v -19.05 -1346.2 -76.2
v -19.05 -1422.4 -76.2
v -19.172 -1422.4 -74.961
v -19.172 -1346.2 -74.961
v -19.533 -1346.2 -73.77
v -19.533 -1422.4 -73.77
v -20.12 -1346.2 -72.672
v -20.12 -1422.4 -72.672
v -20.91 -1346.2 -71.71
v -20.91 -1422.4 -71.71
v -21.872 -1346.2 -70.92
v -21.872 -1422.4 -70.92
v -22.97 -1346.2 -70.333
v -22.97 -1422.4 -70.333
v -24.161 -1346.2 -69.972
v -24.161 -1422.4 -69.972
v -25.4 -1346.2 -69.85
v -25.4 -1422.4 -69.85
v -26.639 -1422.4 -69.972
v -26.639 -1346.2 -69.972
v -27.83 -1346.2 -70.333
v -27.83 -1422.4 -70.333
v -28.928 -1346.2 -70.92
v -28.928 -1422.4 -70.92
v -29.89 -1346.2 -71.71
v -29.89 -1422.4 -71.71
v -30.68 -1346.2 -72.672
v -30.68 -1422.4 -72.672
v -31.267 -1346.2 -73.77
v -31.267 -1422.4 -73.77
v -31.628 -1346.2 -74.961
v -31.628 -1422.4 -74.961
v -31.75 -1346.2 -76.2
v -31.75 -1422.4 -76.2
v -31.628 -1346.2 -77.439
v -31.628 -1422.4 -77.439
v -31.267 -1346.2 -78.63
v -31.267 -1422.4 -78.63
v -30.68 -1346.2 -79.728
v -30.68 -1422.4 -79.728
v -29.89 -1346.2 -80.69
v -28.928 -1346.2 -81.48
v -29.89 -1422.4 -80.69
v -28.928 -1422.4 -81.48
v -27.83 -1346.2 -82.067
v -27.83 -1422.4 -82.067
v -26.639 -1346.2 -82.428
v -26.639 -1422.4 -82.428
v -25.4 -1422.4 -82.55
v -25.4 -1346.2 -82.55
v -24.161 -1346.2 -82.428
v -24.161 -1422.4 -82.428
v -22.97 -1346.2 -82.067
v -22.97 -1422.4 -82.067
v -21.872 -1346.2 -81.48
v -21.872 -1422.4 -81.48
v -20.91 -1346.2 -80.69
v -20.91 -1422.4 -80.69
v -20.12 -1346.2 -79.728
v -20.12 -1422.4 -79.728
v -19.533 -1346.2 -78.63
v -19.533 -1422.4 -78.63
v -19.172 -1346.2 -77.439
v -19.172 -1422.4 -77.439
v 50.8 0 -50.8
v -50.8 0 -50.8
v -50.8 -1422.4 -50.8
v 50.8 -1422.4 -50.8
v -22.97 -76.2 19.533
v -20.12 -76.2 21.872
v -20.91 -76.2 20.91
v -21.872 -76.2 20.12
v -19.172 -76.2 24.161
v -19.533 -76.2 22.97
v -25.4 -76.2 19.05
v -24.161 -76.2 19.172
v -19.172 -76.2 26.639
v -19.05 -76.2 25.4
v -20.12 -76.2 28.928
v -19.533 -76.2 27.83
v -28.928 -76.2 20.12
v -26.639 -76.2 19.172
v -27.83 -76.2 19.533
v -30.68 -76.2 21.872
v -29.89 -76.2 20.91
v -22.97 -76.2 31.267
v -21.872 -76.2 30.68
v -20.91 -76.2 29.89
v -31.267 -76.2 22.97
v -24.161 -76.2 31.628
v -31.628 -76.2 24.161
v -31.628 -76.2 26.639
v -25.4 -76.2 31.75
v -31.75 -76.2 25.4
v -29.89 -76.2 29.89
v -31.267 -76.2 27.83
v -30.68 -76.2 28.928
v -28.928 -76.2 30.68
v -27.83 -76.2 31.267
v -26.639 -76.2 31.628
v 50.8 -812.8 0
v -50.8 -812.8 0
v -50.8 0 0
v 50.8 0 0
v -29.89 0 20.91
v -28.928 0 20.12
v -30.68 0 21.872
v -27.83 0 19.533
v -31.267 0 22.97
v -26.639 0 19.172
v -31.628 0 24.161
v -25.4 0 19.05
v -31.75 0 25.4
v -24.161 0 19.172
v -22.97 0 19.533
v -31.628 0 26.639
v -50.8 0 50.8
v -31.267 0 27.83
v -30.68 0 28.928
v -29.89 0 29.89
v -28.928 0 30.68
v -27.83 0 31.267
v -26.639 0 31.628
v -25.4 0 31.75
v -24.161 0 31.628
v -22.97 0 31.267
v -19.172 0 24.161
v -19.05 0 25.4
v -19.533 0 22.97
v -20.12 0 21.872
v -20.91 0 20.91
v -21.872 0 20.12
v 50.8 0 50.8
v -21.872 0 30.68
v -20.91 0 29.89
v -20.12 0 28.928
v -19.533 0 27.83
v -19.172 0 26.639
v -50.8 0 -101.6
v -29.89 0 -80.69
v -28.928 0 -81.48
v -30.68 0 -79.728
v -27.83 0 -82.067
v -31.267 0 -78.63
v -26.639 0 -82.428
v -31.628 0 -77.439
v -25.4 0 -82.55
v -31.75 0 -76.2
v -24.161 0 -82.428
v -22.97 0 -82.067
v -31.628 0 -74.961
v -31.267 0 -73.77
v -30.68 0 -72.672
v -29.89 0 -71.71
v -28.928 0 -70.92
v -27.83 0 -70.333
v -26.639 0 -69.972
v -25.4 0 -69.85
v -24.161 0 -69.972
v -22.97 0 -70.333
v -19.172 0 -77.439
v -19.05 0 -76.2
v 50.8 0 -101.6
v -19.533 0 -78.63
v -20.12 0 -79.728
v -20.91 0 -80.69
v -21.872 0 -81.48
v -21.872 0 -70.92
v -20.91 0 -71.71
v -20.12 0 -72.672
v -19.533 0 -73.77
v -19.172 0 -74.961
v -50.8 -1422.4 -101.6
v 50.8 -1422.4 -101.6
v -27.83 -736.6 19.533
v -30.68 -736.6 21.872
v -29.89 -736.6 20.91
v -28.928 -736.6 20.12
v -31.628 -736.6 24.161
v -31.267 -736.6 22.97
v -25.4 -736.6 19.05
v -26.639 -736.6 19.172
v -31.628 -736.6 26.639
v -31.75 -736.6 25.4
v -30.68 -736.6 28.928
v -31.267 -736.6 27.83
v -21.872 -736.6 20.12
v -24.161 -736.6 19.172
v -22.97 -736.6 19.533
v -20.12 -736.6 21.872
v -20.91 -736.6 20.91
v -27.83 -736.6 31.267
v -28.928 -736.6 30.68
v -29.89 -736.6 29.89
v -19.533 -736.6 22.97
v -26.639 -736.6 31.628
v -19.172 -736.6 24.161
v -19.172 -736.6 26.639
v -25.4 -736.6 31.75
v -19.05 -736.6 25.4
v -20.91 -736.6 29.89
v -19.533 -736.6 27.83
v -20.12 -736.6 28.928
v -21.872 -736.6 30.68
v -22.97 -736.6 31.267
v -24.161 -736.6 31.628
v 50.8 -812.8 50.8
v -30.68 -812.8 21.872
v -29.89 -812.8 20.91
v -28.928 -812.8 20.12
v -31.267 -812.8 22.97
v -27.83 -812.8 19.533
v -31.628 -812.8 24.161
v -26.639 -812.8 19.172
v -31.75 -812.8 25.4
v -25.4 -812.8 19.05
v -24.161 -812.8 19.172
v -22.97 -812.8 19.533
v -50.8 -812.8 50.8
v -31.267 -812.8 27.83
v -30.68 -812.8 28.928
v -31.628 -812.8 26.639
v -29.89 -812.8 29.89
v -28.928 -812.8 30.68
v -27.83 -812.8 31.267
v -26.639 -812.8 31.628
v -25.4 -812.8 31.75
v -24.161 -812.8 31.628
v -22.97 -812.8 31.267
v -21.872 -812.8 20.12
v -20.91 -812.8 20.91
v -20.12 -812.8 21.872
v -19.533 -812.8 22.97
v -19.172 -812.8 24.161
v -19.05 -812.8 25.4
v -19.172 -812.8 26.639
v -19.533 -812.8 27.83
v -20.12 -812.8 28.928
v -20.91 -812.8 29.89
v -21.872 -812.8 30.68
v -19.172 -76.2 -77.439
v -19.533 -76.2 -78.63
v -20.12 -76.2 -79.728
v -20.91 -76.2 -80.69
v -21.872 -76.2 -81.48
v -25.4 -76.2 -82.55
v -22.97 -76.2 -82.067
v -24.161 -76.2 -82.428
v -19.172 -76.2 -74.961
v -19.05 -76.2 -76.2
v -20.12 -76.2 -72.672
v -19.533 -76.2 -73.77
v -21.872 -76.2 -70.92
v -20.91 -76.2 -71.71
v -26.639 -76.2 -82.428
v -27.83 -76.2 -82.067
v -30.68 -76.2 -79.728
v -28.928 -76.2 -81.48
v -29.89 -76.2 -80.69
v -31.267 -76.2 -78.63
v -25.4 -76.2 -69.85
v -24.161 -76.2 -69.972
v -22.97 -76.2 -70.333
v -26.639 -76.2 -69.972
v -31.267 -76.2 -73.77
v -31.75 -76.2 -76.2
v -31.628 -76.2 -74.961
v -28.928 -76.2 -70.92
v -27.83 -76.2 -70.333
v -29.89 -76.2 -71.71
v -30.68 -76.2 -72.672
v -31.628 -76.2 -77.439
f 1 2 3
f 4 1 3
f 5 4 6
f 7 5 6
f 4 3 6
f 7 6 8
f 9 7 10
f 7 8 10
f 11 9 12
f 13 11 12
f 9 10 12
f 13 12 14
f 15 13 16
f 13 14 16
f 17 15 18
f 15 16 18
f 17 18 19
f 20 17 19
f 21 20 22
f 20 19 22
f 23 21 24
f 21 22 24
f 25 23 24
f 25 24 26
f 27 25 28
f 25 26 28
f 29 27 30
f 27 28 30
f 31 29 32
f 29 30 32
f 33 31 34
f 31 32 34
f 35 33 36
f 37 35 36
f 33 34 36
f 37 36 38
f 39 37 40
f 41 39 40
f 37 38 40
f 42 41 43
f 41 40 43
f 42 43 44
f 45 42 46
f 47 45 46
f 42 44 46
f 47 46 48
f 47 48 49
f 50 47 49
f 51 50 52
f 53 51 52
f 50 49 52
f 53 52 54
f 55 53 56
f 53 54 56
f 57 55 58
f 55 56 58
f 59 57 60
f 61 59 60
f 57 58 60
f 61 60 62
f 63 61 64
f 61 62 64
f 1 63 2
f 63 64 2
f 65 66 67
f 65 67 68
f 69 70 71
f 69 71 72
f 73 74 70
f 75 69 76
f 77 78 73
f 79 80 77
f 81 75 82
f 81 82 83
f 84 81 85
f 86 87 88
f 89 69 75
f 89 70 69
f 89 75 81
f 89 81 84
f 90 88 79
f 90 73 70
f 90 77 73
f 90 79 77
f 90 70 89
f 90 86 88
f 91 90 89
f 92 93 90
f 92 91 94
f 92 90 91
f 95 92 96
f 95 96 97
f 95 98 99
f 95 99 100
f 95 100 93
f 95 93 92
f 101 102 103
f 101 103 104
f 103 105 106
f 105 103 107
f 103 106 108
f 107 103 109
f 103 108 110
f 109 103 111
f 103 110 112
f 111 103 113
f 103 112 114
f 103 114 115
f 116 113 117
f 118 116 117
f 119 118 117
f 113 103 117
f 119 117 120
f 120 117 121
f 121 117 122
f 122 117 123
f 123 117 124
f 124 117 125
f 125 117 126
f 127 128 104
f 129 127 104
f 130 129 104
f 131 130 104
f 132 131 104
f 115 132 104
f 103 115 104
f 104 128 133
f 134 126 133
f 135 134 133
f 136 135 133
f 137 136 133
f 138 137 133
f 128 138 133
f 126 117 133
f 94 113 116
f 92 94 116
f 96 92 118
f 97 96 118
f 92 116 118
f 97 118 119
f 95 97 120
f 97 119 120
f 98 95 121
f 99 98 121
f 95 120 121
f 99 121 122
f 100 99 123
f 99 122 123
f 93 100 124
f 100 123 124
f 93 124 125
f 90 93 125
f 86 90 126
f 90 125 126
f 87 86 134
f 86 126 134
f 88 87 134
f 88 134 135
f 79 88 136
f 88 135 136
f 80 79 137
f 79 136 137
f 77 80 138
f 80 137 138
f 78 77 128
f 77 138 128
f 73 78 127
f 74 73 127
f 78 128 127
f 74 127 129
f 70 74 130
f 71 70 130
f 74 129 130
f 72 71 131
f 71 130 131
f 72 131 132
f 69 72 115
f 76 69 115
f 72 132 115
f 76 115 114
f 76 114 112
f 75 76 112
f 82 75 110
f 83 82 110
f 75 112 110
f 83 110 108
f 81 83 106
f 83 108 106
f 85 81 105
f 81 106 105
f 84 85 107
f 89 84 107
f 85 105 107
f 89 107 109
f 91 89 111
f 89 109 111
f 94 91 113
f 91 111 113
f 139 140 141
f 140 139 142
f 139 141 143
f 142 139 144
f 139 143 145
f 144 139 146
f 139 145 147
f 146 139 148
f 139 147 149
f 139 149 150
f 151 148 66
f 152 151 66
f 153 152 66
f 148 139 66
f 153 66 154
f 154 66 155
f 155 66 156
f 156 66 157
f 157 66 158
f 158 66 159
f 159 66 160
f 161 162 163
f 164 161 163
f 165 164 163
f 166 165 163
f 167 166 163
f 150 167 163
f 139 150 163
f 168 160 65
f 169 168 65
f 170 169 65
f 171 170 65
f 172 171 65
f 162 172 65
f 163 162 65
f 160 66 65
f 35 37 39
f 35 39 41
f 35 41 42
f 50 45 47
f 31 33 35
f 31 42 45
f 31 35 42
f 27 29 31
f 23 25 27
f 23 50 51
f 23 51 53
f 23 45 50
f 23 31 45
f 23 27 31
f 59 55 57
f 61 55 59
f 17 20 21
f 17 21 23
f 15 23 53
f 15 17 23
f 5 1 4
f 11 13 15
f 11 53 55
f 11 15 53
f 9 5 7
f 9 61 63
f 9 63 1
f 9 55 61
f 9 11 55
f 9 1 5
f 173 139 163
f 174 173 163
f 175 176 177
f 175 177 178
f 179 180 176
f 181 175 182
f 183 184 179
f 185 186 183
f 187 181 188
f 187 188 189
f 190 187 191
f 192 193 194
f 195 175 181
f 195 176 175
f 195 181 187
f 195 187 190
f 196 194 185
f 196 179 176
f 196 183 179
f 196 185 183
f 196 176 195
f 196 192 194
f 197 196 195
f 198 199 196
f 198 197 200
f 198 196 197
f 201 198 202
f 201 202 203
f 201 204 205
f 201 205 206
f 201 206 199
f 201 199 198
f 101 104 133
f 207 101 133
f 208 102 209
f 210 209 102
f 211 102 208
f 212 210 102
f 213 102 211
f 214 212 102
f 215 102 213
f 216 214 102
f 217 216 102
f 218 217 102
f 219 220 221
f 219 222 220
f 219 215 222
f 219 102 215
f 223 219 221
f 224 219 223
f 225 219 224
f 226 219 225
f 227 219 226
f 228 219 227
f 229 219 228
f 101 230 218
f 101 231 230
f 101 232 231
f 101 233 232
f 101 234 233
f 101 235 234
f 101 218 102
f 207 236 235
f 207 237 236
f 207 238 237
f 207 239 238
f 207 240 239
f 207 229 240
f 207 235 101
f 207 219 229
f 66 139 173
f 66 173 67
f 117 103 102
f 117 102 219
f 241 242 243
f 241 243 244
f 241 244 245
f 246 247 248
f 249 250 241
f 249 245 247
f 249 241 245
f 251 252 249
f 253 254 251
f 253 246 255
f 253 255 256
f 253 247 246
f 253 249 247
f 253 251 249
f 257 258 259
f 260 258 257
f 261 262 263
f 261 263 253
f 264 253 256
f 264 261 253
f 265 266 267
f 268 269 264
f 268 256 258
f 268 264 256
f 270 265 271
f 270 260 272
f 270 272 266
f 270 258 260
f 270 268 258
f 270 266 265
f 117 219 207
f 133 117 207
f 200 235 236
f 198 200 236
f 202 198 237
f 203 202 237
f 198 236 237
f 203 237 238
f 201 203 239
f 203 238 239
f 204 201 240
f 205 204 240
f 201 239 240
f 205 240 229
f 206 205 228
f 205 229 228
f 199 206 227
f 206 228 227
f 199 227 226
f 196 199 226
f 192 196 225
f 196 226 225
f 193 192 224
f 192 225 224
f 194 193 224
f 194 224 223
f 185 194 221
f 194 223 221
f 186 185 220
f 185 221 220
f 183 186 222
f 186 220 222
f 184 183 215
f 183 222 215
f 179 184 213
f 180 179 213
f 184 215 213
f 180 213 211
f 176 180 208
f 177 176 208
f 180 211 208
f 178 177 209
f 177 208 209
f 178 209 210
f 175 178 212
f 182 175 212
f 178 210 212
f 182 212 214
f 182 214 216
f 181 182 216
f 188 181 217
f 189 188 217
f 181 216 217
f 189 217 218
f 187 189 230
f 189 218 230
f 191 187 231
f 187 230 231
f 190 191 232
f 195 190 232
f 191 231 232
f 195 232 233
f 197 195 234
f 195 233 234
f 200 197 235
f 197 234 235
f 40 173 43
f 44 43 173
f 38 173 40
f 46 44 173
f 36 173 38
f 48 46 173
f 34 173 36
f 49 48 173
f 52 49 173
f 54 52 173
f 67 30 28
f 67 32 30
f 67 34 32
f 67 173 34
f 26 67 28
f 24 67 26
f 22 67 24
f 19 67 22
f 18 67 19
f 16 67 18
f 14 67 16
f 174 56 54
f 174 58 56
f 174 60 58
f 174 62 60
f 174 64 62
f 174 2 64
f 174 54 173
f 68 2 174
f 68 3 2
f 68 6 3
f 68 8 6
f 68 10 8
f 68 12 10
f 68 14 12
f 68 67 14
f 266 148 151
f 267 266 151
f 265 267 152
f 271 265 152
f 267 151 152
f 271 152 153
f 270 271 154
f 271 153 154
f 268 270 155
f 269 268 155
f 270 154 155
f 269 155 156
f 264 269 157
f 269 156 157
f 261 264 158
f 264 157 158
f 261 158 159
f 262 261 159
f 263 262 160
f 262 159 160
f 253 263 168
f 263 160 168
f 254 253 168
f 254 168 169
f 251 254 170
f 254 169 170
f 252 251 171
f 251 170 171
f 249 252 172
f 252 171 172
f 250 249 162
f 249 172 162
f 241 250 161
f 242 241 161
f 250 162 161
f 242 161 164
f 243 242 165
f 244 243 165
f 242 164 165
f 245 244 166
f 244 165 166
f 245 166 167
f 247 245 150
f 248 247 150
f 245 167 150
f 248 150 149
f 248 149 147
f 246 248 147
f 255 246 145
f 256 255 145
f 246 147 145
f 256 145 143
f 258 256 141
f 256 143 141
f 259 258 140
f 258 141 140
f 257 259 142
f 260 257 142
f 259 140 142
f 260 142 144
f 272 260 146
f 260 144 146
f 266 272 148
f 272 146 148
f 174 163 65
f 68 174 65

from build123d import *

# Parameters (mm, degrees)
F0_W      = 101.6
F0_H      = 50.8
F1_DEPTH  = 812.8
F2_W      = 101.6
F2_H      = 50.8
F3_DEPTH  = 1422.4
F4_R      = 6.35
F5_DEPTH  = 76.2
F6_R      = 6.35
F7_DEPTH  = 76.2
F8_R      = 6.35
F9_DEPTH  = 76.2
F10_R     = 6.35
F11_DEPTH = 76.2


with BuildPart() as f1:
    # F0 (on Front) → F1 (new body)
    with BuildSketch(Plane.XZ):
        with Locations((0, 25.4)):
            Rectangle(F0_W, F0_H)
    extrude(amount=F1_DEPTH)

    # F4 (on face) → F5 (cut)
    with BuildSketch(Plane.XZ.offset(812.8)):
        with Locations((-25.4, 25.4)):
            Circle(F4_R)
    extrude(amount=-F5_DEPTH, mode=Mode.SUBTRACT)

    # F6 (on face) → F7 (cut)
    with BuildSketch(Plane(origin=(0, 0, 0), x_dir=(-1, 0, 0), z_dir=(0, 1, 0))):
        with Locations((25.4, 25.4)):
            Circle(F6_R)
    extrude(amount=-F7_DEPTH, mode=Mode.SUBTRACT)


with BuildPart() as f3:
    # F2 (on Front) → F3 (new body)
    with BuildSketch(Plane.XZ):
        with Locations((0, -76.2)):
            Rectangle(F2_W, F2_H)
    extrude(amount=F3_DEPTH)

    # F8 (on face) → F9 (cut)
    with BuildSketch(Plane.XZ.offset(1422.4)):
        with Locations((-25.4, -76.2)):
            Circle(F8_R)
    extrude(amount=-F9_DEPTH, mode=Mode.SUBTRACT)

    # F10 (on face) → F11 (cut)
    with BuildSketch(Plane(origin=(0, 0, 0), x_dir=(-1, 0, 0), z_dir=(0, 1, 0))):
        with Locations((25.4, -76.2)):
            Circle(F10_R)
    extrude(amount=-F11_DEPTH, mode=Mode.SUBTRACT)


solid = Compound([f1.part, f3.part])
